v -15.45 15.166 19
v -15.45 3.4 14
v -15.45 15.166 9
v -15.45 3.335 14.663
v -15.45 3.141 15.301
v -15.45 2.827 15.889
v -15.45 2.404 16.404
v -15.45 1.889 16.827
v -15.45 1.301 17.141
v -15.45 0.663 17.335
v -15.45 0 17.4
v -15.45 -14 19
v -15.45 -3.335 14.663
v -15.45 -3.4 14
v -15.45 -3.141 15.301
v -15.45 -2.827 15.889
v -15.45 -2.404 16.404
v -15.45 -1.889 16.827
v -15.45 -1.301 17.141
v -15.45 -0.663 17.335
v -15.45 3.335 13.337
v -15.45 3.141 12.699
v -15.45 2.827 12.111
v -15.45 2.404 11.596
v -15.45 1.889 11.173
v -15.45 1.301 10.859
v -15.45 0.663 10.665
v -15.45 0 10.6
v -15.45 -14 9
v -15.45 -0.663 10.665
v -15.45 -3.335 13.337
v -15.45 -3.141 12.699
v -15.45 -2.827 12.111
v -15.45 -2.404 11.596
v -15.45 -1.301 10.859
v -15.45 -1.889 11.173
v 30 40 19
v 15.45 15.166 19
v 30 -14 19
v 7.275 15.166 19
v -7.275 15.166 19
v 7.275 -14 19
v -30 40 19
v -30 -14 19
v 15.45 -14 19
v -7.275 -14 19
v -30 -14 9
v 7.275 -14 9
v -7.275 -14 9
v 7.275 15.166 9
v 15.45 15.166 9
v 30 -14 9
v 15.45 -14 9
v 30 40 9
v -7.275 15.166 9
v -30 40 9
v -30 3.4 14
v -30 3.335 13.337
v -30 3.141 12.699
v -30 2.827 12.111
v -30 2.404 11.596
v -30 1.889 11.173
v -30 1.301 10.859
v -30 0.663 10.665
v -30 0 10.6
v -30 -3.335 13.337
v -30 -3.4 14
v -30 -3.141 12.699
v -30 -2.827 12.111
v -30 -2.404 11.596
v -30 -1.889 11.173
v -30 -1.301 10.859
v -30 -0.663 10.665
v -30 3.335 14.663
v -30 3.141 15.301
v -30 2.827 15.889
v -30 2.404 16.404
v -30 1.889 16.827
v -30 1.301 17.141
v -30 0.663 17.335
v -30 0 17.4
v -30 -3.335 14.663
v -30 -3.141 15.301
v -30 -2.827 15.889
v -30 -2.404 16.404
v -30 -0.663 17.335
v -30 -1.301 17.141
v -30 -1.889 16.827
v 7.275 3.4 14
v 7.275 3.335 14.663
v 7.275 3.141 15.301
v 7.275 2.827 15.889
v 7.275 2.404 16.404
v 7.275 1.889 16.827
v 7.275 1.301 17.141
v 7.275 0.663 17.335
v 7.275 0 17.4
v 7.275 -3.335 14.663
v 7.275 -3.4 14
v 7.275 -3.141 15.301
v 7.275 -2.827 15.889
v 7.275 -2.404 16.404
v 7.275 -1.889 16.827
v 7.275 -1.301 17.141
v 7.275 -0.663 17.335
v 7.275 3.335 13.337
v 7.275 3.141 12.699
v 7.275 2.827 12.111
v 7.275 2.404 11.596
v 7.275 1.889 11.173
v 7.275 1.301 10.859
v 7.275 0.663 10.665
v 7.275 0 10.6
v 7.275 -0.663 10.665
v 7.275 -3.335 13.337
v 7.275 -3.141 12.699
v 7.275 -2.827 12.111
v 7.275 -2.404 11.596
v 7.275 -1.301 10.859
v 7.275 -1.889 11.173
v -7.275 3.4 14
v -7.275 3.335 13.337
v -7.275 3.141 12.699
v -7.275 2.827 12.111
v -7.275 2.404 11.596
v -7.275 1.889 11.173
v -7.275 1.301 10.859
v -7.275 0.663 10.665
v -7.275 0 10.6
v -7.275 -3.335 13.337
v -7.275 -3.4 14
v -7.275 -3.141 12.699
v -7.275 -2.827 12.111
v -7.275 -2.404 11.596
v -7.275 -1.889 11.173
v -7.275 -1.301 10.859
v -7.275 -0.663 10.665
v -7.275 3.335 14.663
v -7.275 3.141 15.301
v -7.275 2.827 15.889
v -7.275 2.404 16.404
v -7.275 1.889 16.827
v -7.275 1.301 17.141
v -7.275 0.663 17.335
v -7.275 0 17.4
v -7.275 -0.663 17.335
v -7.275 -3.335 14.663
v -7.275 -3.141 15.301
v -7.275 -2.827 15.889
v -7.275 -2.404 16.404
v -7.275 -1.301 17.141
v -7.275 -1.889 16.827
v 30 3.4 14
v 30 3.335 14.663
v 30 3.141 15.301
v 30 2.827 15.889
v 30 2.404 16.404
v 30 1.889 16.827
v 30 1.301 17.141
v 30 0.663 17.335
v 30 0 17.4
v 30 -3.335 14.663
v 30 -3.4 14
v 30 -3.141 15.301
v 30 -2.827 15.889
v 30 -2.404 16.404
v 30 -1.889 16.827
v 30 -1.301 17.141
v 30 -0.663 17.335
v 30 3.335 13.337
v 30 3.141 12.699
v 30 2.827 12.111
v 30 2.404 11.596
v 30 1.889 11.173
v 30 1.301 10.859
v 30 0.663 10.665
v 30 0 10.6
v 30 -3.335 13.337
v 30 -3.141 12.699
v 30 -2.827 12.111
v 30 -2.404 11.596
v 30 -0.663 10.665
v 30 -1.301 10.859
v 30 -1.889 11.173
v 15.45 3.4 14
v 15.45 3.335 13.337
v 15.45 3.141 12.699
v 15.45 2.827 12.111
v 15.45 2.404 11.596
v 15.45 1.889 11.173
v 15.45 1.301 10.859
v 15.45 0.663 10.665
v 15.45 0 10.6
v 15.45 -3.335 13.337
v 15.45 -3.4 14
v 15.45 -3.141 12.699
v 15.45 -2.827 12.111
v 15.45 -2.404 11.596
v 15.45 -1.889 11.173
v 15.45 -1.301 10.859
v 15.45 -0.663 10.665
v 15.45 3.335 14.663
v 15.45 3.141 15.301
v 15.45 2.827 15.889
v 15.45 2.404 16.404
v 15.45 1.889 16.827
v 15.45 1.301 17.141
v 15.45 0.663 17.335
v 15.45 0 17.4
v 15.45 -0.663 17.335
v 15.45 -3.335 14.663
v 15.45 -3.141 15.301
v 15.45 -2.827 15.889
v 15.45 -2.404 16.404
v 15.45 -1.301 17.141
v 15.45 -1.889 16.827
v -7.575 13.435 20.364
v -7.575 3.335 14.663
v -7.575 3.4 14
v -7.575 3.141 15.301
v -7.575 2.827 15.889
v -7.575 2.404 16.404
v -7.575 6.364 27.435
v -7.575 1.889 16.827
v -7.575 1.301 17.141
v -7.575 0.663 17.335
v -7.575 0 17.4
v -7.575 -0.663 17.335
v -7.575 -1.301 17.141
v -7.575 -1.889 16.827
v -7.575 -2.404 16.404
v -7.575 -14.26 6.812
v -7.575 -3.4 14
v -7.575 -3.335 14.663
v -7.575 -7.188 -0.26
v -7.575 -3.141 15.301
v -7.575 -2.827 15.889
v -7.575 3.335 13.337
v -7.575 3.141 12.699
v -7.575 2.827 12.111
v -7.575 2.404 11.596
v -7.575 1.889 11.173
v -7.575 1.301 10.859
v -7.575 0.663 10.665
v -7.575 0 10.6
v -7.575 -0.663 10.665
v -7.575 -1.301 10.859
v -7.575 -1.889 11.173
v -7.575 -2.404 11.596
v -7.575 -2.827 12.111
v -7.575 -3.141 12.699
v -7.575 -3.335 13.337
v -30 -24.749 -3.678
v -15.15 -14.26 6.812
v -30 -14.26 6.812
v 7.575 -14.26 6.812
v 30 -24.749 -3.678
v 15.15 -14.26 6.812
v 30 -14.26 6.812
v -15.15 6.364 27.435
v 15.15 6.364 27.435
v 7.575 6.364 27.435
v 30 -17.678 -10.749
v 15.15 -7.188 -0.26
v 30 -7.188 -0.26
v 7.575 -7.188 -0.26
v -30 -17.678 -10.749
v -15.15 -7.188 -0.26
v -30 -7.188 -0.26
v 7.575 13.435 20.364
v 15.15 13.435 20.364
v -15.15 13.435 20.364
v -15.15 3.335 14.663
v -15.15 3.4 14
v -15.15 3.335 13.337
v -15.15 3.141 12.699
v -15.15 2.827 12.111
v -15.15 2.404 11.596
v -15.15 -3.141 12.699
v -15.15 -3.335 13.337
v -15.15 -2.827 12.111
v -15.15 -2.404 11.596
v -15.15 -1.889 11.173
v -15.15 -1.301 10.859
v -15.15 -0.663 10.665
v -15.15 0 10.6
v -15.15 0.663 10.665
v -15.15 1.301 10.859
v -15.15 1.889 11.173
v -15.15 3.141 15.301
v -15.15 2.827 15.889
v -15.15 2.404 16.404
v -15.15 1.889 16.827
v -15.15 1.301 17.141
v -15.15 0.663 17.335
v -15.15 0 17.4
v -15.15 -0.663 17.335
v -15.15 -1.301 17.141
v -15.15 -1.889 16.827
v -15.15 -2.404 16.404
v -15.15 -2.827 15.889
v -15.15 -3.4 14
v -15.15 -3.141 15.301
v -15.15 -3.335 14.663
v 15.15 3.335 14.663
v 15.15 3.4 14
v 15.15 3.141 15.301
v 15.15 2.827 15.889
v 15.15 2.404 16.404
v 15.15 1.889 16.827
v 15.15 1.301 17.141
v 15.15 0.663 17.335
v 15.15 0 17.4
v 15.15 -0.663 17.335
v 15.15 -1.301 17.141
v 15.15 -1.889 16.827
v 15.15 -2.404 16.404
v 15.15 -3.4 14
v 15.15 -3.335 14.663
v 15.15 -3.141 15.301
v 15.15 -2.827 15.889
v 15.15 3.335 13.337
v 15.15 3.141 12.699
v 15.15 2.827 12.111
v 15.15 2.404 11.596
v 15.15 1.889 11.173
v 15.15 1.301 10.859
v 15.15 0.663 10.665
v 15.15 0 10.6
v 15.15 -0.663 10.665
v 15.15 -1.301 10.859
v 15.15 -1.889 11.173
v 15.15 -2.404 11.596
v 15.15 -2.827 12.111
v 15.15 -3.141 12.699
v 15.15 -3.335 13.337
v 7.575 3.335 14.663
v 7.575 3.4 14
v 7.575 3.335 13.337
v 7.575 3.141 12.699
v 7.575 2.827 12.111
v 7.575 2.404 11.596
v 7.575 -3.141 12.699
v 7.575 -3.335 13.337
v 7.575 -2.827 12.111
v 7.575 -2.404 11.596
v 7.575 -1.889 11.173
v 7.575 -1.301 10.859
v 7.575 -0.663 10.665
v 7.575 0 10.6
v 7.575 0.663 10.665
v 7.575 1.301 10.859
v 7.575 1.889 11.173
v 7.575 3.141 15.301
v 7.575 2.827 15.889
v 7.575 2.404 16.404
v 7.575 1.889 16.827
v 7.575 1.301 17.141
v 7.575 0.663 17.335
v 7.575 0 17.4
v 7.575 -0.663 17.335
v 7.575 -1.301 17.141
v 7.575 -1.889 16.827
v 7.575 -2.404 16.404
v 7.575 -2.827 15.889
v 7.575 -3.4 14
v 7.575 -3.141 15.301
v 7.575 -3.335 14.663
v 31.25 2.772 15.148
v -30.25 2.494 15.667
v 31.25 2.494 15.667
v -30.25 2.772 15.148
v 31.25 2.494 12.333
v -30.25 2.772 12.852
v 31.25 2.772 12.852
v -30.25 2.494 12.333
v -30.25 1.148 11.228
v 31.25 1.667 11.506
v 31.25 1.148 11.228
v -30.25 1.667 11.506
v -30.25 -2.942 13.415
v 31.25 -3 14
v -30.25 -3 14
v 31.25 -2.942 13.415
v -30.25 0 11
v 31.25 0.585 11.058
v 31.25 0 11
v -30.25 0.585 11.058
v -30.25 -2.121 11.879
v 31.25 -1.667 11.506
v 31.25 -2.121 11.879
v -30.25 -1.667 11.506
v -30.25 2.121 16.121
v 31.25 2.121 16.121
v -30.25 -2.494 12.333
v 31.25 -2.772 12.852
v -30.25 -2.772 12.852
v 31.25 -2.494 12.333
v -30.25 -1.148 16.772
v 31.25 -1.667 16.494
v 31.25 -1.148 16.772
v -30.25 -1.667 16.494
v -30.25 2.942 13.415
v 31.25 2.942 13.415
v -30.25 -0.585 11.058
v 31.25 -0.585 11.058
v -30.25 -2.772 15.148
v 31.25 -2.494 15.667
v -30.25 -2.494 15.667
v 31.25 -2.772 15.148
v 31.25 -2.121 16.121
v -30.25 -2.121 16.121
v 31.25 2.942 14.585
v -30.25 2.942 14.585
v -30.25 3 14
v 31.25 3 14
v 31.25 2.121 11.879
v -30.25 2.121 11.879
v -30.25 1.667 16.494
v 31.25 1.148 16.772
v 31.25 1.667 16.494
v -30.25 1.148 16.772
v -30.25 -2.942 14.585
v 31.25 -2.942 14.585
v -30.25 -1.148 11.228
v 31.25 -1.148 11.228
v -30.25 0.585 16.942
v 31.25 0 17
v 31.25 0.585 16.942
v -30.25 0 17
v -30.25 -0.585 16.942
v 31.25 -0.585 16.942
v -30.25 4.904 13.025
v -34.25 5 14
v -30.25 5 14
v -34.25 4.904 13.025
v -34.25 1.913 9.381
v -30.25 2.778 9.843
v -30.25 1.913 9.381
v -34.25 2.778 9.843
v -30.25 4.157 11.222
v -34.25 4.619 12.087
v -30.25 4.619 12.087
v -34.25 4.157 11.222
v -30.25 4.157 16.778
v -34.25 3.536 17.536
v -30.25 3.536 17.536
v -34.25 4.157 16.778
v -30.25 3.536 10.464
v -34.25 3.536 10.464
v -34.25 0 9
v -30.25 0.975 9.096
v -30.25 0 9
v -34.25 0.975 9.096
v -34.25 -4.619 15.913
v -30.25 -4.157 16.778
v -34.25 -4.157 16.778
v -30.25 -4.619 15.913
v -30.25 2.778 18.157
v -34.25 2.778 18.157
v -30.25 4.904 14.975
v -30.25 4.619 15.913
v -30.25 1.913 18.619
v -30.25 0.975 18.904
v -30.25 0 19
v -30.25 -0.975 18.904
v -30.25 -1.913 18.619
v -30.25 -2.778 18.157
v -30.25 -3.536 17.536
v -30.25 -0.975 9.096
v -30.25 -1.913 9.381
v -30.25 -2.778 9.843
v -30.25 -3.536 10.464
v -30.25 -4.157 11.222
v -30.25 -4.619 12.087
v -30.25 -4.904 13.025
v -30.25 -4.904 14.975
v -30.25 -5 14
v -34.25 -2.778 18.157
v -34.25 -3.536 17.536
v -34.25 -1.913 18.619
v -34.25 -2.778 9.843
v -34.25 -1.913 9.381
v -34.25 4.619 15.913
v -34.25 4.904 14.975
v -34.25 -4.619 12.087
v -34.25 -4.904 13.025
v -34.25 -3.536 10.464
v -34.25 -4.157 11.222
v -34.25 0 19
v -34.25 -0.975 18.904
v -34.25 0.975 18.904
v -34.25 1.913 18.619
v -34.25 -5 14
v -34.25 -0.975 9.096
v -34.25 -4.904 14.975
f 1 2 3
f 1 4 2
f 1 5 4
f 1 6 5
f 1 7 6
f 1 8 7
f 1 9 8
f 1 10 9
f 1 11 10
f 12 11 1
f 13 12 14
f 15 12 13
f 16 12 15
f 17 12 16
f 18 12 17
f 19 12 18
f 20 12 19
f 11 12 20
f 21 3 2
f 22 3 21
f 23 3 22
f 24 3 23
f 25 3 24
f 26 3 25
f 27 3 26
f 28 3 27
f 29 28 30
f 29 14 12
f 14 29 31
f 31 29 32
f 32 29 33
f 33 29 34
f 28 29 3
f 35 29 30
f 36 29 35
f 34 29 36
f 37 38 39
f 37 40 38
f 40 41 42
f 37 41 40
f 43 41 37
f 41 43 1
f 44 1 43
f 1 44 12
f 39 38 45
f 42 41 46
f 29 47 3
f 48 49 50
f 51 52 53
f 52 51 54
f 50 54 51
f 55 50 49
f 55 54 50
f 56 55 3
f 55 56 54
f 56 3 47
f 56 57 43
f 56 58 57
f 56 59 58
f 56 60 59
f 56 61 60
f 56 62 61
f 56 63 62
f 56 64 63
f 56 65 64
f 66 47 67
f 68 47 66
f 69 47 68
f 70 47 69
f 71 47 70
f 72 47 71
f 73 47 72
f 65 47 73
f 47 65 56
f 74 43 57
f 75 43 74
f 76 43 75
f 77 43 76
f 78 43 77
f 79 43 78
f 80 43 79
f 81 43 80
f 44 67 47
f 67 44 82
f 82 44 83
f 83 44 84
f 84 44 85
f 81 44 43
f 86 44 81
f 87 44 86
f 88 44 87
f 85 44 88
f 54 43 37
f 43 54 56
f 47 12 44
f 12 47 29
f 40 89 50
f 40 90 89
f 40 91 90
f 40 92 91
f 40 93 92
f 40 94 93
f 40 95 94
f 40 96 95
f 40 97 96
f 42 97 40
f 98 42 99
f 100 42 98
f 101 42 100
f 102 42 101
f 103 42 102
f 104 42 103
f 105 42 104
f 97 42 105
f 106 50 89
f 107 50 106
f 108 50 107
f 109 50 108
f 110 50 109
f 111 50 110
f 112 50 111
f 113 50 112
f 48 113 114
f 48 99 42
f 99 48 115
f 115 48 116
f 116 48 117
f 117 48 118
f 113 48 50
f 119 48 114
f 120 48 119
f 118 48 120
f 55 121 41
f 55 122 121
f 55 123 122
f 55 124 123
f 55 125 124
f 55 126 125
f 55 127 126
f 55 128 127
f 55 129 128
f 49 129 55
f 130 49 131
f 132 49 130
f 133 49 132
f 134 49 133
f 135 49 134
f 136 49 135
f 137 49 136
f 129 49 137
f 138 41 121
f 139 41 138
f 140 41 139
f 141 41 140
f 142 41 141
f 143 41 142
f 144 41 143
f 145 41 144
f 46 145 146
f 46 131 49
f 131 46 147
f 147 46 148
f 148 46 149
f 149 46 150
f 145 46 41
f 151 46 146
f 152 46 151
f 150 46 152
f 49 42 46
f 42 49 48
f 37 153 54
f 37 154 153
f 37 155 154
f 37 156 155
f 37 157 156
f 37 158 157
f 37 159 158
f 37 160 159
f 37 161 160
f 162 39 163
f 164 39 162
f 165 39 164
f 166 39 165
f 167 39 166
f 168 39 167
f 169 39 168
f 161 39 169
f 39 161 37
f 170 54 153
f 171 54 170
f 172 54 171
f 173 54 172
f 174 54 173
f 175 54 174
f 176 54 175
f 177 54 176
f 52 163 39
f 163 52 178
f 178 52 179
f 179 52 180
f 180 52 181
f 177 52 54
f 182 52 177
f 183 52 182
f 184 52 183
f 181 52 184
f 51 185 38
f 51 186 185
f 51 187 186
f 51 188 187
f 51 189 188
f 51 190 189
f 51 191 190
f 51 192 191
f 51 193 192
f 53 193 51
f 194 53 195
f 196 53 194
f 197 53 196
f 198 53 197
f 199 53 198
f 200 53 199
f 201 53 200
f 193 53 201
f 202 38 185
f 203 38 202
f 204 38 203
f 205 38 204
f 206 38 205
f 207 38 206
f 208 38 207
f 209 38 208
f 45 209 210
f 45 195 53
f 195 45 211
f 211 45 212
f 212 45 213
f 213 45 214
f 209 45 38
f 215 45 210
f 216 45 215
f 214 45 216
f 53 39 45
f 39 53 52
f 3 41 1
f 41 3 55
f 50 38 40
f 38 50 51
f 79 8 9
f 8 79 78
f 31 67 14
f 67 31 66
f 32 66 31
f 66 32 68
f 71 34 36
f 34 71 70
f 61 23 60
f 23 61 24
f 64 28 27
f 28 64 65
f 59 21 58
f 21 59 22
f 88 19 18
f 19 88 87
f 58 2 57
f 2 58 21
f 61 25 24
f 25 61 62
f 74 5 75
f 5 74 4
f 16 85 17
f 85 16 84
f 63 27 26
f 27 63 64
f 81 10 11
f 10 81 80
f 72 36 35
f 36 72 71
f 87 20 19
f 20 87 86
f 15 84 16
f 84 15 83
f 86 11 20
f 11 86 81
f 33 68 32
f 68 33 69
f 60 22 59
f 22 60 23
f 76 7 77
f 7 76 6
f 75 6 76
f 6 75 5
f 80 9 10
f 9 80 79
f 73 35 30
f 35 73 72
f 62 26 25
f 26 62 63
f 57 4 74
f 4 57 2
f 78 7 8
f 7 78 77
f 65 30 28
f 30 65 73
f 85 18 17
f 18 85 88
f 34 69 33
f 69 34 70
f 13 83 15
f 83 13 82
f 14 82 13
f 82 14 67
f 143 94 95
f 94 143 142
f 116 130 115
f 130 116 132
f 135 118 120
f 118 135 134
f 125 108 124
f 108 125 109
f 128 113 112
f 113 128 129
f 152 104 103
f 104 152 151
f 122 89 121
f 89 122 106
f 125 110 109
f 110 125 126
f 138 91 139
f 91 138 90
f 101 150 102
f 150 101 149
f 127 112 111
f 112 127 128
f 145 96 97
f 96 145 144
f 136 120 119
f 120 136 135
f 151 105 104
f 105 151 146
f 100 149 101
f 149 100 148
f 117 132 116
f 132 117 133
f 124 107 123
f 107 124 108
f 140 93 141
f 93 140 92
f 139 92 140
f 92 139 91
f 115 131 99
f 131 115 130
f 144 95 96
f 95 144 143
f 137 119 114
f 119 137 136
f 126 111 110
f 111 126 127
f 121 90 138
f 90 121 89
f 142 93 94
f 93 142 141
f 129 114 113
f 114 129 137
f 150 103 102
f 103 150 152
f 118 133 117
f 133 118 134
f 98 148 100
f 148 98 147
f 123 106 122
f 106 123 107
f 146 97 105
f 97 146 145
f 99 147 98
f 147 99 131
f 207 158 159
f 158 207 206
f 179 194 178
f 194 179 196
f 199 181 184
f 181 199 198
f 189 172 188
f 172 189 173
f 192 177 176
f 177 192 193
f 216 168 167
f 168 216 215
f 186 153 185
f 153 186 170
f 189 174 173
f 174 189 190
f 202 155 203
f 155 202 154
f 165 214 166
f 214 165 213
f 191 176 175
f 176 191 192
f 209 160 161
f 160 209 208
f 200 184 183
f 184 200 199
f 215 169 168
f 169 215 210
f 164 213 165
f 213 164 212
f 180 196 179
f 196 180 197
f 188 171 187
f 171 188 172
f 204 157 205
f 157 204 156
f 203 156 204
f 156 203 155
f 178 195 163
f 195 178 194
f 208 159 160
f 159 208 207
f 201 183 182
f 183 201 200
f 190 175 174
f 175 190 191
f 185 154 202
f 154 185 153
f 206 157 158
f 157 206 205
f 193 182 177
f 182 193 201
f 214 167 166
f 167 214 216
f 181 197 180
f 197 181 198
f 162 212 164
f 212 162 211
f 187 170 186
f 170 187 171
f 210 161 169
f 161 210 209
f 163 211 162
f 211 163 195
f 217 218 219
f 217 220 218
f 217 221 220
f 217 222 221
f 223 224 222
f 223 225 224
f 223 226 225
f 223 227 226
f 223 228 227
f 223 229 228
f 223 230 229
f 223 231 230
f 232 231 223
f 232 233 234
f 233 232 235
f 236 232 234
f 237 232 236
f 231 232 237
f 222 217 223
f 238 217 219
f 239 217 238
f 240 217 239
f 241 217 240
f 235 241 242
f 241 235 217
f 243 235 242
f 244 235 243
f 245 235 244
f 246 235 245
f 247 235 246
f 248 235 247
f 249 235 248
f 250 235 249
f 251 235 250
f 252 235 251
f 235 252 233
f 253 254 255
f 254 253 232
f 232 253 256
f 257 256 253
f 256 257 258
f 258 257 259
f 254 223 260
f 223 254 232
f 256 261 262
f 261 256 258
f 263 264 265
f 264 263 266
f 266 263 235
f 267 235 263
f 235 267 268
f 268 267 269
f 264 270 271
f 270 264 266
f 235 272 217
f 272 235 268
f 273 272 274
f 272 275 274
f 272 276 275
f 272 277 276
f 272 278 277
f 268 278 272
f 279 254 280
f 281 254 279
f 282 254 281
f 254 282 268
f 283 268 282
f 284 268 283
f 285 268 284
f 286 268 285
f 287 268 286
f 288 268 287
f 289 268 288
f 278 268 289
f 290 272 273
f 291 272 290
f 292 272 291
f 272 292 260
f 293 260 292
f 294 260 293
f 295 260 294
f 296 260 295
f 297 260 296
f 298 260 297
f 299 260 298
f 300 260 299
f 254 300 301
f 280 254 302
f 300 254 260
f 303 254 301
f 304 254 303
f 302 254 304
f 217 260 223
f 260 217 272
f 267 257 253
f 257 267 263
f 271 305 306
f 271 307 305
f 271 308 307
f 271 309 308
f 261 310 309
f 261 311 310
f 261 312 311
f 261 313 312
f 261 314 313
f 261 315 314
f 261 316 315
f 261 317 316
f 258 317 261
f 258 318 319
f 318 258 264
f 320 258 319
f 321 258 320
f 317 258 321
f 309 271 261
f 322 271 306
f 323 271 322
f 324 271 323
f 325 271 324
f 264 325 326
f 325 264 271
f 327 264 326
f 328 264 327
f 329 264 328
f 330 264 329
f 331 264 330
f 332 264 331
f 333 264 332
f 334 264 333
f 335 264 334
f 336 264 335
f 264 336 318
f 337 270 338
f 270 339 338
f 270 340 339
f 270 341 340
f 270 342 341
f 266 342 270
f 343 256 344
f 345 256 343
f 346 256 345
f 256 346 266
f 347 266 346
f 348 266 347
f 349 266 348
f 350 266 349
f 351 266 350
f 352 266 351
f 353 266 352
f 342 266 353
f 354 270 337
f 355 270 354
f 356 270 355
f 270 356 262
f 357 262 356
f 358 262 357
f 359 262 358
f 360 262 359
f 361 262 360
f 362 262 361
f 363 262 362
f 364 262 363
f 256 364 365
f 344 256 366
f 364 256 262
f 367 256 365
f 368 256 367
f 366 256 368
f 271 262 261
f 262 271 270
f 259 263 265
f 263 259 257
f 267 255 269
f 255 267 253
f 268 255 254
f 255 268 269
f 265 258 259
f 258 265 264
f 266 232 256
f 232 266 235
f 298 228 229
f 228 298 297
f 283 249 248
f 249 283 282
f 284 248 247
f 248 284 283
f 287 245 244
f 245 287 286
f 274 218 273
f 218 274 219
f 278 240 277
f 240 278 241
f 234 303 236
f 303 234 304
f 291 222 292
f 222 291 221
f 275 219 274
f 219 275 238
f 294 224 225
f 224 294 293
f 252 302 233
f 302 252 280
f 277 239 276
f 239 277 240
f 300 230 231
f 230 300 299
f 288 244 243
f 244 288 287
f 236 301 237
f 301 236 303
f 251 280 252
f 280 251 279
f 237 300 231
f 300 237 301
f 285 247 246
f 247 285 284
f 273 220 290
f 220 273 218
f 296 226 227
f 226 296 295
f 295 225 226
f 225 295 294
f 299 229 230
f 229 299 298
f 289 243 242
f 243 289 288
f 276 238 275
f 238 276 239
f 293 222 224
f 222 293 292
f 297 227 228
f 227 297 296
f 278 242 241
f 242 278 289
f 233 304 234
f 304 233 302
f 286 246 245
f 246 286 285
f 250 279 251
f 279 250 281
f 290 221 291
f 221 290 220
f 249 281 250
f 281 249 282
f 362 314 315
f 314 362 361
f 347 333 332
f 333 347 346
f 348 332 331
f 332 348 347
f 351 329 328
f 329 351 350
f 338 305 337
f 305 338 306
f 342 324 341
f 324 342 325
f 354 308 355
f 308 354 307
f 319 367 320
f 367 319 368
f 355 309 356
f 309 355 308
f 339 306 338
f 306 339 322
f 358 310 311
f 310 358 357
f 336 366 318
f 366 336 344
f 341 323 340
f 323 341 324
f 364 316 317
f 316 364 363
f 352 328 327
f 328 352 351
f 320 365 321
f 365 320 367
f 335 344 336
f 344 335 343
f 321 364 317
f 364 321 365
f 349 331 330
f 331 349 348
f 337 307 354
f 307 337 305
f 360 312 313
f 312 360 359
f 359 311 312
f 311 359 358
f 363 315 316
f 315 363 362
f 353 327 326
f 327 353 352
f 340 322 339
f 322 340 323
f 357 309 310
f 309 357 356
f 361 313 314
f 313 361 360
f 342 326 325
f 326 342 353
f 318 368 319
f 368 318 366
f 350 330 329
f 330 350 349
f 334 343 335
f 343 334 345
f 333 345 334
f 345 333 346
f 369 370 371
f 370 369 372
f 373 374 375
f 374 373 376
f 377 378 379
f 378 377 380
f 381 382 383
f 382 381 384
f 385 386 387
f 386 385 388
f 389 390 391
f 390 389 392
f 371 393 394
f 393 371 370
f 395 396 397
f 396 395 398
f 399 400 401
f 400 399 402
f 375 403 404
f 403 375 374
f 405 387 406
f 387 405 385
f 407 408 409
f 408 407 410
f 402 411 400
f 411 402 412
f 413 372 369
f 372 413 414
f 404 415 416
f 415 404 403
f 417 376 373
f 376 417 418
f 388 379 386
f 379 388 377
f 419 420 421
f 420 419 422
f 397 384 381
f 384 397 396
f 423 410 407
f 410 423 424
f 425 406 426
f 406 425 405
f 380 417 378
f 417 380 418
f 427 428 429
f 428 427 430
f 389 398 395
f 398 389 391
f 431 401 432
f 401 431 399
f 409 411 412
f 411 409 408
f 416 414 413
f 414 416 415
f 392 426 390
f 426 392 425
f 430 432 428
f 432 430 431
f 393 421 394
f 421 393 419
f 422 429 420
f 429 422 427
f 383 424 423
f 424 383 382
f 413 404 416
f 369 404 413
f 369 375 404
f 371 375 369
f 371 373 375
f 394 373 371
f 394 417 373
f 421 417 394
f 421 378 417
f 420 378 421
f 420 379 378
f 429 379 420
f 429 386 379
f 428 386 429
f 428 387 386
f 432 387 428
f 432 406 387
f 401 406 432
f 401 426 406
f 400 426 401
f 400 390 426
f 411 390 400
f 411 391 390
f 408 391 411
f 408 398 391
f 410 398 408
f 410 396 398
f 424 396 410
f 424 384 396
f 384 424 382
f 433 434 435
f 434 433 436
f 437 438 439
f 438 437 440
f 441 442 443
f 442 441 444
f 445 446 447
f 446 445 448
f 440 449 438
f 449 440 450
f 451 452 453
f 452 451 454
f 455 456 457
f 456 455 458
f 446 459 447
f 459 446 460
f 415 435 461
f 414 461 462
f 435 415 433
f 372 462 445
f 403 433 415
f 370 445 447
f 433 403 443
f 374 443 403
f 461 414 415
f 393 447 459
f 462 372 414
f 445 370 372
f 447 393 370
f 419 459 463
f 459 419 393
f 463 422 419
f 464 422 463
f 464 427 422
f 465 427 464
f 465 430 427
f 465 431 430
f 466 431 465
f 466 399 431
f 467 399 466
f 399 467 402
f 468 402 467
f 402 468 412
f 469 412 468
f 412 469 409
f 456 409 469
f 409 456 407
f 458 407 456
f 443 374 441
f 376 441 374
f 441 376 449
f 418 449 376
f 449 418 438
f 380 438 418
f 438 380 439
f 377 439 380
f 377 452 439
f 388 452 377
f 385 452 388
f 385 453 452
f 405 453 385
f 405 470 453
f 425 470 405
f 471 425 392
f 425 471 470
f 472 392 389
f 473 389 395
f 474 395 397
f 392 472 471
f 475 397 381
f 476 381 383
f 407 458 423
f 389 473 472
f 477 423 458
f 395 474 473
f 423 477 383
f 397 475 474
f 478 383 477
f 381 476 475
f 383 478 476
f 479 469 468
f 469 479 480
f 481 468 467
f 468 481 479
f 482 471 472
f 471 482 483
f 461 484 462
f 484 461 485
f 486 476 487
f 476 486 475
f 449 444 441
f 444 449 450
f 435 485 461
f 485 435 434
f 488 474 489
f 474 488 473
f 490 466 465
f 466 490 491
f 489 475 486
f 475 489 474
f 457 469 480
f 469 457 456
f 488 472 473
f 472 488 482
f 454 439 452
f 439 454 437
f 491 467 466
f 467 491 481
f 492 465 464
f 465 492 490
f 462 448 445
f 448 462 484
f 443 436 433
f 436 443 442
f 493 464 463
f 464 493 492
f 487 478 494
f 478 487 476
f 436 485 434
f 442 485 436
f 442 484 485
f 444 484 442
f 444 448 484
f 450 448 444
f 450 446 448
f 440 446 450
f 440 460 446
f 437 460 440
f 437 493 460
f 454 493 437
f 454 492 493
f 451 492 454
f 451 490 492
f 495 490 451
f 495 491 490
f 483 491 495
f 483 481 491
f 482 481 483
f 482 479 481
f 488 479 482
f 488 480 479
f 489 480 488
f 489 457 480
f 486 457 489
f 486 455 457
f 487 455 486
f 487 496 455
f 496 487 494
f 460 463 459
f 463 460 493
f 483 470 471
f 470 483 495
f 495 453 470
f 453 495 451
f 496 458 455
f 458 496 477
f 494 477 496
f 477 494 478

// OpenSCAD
$fn = 32;

// ------------------------------------------------------------------------
// Butt hinge: hinge 60 mm, leaf swung 45 deg
// Every part is its own module, assembly() places every instance.
// ------------------------------------------------------------------------

// --- part 1 ---
module hinge_base() {
  difference() {
    union() {
      translate([-30, -14, -5]) cube([14.55, 54, 10]);
      translate([-7.275, -14, -5]) cube([14.55, 54, 10]);
      translate([15.45, -14, -5]) cube([14.55, 54, 10]);
      translate([-30, 15.166, -5]) cube([60, 24.834, 10]);
    }
    translate([-22.725, 0, 0]) rotate([0, 90, 0]) cylinder(h = 16.55, d = 6.8, center = true);
    translate([0, 0, 0]) rotate([0, 90, 0]) cylinder(h = 16.55, d = 6.8, center = true);
    translate([22.725, 0, 0]) rotate([0, 90, 0]) cylinder(h = 16.55, d = 6.8, center = true);
  }
}

// --- part 2 ---
module hinge_mover() {
  difference() {
    union() {
      translate([-15.15, -30, -5]) cube([7.575, 44, 10]);
      translate([7.575, -30, -5]) cube([7.575, 44, 10]);
      translate([-30, -30, -5]) cube([60, 14.834, 10]);
    }
    translate([-11.362, 0, 0]) rotate([0, 90, 0]) cylinder(h = 9.575, d = 6.8, center = true);
    translate([11.362, 0, 0]) rotate([0, 90, 0]) cylinder(h = 9.575, d = 6.8, center = true);
  }
}

// --- part 3 ---
module hinge_pin() {
  rotate([0, 90, 0]) cylinder(h = 62.5, d = 6, center = true);
  translate([-34.25, 0, 0]) rotate([0, 90, 0]) cylinder(h = 4, d = 10);
}

// --- assembly ---
module assembly() {
  color([0.80, 0.24, 0.20]) translate([0, 0, 14]) rotate([0, 0, 0]) hinge_base();
  color([0.20, 0.45, 0.75]) translate([0, 0, 14]) rotate([45, 0, 0]) hinge_mover();
  color([0.25, 0.62, 0.32]) translate([0, 0, 14]) rotate([0, 0, 0]) hinge_pin();
}

assembly();
